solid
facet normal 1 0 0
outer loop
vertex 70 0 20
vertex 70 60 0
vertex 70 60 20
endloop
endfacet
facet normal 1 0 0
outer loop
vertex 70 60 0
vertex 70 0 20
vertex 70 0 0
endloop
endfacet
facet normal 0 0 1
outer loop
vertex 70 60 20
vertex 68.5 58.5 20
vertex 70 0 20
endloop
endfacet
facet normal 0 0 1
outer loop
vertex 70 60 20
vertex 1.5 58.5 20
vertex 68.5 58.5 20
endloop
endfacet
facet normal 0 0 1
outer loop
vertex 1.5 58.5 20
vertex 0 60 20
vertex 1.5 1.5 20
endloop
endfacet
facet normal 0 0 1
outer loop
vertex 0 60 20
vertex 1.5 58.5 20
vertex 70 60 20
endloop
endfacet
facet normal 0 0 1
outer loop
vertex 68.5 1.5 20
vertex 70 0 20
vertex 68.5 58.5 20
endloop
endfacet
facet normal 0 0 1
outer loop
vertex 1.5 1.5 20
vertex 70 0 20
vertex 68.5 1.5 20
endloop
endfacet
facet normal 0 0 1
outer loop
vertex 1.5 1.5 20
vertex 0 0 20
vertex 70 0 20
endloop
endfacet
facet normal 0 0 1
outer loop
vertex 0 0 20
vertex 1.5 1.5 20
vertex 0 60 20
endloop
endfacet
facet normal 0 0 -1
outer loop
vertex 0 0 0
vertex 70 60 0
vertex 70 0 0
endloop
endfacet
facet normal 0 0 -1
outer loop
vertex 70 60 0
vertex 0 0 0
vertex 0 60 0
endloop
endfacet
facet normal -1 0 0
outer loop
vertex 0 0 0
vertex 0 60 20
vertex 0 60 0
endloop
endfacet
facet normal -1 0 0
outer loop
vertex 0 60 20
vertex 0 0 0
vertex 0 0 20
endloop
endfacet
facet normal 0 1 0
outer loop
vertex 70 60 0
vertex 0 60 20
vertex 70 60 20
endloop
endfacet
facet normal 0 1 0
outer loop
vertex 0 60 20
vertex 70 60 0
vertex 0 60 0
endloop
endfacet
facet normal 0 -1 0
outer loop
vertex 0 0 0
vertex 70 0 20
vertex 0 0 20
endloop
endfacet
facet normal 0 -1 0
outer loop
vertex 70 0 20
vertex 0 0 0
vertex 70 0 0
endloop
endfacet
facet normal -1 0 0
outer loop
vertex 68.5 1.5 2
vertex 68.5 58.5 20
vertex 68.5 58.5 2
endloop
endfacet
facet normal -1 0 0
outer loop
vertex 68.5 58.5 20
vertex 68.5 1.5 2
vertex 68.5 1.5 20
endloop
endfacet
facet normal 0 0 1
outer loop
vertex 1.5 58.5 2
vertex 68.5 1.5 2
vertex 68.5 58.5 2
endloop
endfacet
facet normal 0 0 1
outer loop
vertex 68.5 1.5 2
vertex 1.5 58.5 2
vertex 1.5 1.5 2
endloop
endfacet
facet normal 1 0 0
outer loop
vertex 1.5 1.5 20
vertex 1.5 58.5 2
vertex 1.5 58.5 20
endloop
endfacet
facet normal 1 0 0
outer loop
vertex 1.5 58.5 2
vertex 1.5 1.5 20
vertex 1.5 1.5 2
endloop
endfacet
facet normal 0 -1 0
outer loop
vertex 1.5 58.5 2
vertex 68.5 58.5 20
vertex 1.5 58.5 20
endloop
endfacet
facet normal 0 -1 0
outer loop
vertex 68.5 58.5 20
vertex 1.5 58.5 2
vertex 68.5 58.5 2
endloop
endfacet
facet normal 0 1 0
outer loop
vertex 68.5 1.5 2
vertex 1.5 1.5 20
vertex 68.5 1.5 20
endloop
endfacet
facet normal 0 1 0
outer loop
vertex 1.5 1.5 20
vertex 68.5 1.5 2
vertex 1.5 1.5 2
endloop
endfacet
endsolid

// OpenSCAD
$fn = 32;

// ----------------------------------------------------------------------
// Open box: 1.5 mm walls
// ----------------------------------------------------------------------

// --- parameters (mm) ---
box_l = 70;               // outer length, X
box_w = 60;               // outer width, Y
box_h = 20;               // outer height, Z
wall = 1.5;               // wall thickness
floor = 2;                // floor thickness

difference() {
  cube([box_l, box_w, box_h]);
  translate([wall, wall, floor])
    cube([box_l - 2 * wall, box_w - 2 * wall, box_h]);
}
